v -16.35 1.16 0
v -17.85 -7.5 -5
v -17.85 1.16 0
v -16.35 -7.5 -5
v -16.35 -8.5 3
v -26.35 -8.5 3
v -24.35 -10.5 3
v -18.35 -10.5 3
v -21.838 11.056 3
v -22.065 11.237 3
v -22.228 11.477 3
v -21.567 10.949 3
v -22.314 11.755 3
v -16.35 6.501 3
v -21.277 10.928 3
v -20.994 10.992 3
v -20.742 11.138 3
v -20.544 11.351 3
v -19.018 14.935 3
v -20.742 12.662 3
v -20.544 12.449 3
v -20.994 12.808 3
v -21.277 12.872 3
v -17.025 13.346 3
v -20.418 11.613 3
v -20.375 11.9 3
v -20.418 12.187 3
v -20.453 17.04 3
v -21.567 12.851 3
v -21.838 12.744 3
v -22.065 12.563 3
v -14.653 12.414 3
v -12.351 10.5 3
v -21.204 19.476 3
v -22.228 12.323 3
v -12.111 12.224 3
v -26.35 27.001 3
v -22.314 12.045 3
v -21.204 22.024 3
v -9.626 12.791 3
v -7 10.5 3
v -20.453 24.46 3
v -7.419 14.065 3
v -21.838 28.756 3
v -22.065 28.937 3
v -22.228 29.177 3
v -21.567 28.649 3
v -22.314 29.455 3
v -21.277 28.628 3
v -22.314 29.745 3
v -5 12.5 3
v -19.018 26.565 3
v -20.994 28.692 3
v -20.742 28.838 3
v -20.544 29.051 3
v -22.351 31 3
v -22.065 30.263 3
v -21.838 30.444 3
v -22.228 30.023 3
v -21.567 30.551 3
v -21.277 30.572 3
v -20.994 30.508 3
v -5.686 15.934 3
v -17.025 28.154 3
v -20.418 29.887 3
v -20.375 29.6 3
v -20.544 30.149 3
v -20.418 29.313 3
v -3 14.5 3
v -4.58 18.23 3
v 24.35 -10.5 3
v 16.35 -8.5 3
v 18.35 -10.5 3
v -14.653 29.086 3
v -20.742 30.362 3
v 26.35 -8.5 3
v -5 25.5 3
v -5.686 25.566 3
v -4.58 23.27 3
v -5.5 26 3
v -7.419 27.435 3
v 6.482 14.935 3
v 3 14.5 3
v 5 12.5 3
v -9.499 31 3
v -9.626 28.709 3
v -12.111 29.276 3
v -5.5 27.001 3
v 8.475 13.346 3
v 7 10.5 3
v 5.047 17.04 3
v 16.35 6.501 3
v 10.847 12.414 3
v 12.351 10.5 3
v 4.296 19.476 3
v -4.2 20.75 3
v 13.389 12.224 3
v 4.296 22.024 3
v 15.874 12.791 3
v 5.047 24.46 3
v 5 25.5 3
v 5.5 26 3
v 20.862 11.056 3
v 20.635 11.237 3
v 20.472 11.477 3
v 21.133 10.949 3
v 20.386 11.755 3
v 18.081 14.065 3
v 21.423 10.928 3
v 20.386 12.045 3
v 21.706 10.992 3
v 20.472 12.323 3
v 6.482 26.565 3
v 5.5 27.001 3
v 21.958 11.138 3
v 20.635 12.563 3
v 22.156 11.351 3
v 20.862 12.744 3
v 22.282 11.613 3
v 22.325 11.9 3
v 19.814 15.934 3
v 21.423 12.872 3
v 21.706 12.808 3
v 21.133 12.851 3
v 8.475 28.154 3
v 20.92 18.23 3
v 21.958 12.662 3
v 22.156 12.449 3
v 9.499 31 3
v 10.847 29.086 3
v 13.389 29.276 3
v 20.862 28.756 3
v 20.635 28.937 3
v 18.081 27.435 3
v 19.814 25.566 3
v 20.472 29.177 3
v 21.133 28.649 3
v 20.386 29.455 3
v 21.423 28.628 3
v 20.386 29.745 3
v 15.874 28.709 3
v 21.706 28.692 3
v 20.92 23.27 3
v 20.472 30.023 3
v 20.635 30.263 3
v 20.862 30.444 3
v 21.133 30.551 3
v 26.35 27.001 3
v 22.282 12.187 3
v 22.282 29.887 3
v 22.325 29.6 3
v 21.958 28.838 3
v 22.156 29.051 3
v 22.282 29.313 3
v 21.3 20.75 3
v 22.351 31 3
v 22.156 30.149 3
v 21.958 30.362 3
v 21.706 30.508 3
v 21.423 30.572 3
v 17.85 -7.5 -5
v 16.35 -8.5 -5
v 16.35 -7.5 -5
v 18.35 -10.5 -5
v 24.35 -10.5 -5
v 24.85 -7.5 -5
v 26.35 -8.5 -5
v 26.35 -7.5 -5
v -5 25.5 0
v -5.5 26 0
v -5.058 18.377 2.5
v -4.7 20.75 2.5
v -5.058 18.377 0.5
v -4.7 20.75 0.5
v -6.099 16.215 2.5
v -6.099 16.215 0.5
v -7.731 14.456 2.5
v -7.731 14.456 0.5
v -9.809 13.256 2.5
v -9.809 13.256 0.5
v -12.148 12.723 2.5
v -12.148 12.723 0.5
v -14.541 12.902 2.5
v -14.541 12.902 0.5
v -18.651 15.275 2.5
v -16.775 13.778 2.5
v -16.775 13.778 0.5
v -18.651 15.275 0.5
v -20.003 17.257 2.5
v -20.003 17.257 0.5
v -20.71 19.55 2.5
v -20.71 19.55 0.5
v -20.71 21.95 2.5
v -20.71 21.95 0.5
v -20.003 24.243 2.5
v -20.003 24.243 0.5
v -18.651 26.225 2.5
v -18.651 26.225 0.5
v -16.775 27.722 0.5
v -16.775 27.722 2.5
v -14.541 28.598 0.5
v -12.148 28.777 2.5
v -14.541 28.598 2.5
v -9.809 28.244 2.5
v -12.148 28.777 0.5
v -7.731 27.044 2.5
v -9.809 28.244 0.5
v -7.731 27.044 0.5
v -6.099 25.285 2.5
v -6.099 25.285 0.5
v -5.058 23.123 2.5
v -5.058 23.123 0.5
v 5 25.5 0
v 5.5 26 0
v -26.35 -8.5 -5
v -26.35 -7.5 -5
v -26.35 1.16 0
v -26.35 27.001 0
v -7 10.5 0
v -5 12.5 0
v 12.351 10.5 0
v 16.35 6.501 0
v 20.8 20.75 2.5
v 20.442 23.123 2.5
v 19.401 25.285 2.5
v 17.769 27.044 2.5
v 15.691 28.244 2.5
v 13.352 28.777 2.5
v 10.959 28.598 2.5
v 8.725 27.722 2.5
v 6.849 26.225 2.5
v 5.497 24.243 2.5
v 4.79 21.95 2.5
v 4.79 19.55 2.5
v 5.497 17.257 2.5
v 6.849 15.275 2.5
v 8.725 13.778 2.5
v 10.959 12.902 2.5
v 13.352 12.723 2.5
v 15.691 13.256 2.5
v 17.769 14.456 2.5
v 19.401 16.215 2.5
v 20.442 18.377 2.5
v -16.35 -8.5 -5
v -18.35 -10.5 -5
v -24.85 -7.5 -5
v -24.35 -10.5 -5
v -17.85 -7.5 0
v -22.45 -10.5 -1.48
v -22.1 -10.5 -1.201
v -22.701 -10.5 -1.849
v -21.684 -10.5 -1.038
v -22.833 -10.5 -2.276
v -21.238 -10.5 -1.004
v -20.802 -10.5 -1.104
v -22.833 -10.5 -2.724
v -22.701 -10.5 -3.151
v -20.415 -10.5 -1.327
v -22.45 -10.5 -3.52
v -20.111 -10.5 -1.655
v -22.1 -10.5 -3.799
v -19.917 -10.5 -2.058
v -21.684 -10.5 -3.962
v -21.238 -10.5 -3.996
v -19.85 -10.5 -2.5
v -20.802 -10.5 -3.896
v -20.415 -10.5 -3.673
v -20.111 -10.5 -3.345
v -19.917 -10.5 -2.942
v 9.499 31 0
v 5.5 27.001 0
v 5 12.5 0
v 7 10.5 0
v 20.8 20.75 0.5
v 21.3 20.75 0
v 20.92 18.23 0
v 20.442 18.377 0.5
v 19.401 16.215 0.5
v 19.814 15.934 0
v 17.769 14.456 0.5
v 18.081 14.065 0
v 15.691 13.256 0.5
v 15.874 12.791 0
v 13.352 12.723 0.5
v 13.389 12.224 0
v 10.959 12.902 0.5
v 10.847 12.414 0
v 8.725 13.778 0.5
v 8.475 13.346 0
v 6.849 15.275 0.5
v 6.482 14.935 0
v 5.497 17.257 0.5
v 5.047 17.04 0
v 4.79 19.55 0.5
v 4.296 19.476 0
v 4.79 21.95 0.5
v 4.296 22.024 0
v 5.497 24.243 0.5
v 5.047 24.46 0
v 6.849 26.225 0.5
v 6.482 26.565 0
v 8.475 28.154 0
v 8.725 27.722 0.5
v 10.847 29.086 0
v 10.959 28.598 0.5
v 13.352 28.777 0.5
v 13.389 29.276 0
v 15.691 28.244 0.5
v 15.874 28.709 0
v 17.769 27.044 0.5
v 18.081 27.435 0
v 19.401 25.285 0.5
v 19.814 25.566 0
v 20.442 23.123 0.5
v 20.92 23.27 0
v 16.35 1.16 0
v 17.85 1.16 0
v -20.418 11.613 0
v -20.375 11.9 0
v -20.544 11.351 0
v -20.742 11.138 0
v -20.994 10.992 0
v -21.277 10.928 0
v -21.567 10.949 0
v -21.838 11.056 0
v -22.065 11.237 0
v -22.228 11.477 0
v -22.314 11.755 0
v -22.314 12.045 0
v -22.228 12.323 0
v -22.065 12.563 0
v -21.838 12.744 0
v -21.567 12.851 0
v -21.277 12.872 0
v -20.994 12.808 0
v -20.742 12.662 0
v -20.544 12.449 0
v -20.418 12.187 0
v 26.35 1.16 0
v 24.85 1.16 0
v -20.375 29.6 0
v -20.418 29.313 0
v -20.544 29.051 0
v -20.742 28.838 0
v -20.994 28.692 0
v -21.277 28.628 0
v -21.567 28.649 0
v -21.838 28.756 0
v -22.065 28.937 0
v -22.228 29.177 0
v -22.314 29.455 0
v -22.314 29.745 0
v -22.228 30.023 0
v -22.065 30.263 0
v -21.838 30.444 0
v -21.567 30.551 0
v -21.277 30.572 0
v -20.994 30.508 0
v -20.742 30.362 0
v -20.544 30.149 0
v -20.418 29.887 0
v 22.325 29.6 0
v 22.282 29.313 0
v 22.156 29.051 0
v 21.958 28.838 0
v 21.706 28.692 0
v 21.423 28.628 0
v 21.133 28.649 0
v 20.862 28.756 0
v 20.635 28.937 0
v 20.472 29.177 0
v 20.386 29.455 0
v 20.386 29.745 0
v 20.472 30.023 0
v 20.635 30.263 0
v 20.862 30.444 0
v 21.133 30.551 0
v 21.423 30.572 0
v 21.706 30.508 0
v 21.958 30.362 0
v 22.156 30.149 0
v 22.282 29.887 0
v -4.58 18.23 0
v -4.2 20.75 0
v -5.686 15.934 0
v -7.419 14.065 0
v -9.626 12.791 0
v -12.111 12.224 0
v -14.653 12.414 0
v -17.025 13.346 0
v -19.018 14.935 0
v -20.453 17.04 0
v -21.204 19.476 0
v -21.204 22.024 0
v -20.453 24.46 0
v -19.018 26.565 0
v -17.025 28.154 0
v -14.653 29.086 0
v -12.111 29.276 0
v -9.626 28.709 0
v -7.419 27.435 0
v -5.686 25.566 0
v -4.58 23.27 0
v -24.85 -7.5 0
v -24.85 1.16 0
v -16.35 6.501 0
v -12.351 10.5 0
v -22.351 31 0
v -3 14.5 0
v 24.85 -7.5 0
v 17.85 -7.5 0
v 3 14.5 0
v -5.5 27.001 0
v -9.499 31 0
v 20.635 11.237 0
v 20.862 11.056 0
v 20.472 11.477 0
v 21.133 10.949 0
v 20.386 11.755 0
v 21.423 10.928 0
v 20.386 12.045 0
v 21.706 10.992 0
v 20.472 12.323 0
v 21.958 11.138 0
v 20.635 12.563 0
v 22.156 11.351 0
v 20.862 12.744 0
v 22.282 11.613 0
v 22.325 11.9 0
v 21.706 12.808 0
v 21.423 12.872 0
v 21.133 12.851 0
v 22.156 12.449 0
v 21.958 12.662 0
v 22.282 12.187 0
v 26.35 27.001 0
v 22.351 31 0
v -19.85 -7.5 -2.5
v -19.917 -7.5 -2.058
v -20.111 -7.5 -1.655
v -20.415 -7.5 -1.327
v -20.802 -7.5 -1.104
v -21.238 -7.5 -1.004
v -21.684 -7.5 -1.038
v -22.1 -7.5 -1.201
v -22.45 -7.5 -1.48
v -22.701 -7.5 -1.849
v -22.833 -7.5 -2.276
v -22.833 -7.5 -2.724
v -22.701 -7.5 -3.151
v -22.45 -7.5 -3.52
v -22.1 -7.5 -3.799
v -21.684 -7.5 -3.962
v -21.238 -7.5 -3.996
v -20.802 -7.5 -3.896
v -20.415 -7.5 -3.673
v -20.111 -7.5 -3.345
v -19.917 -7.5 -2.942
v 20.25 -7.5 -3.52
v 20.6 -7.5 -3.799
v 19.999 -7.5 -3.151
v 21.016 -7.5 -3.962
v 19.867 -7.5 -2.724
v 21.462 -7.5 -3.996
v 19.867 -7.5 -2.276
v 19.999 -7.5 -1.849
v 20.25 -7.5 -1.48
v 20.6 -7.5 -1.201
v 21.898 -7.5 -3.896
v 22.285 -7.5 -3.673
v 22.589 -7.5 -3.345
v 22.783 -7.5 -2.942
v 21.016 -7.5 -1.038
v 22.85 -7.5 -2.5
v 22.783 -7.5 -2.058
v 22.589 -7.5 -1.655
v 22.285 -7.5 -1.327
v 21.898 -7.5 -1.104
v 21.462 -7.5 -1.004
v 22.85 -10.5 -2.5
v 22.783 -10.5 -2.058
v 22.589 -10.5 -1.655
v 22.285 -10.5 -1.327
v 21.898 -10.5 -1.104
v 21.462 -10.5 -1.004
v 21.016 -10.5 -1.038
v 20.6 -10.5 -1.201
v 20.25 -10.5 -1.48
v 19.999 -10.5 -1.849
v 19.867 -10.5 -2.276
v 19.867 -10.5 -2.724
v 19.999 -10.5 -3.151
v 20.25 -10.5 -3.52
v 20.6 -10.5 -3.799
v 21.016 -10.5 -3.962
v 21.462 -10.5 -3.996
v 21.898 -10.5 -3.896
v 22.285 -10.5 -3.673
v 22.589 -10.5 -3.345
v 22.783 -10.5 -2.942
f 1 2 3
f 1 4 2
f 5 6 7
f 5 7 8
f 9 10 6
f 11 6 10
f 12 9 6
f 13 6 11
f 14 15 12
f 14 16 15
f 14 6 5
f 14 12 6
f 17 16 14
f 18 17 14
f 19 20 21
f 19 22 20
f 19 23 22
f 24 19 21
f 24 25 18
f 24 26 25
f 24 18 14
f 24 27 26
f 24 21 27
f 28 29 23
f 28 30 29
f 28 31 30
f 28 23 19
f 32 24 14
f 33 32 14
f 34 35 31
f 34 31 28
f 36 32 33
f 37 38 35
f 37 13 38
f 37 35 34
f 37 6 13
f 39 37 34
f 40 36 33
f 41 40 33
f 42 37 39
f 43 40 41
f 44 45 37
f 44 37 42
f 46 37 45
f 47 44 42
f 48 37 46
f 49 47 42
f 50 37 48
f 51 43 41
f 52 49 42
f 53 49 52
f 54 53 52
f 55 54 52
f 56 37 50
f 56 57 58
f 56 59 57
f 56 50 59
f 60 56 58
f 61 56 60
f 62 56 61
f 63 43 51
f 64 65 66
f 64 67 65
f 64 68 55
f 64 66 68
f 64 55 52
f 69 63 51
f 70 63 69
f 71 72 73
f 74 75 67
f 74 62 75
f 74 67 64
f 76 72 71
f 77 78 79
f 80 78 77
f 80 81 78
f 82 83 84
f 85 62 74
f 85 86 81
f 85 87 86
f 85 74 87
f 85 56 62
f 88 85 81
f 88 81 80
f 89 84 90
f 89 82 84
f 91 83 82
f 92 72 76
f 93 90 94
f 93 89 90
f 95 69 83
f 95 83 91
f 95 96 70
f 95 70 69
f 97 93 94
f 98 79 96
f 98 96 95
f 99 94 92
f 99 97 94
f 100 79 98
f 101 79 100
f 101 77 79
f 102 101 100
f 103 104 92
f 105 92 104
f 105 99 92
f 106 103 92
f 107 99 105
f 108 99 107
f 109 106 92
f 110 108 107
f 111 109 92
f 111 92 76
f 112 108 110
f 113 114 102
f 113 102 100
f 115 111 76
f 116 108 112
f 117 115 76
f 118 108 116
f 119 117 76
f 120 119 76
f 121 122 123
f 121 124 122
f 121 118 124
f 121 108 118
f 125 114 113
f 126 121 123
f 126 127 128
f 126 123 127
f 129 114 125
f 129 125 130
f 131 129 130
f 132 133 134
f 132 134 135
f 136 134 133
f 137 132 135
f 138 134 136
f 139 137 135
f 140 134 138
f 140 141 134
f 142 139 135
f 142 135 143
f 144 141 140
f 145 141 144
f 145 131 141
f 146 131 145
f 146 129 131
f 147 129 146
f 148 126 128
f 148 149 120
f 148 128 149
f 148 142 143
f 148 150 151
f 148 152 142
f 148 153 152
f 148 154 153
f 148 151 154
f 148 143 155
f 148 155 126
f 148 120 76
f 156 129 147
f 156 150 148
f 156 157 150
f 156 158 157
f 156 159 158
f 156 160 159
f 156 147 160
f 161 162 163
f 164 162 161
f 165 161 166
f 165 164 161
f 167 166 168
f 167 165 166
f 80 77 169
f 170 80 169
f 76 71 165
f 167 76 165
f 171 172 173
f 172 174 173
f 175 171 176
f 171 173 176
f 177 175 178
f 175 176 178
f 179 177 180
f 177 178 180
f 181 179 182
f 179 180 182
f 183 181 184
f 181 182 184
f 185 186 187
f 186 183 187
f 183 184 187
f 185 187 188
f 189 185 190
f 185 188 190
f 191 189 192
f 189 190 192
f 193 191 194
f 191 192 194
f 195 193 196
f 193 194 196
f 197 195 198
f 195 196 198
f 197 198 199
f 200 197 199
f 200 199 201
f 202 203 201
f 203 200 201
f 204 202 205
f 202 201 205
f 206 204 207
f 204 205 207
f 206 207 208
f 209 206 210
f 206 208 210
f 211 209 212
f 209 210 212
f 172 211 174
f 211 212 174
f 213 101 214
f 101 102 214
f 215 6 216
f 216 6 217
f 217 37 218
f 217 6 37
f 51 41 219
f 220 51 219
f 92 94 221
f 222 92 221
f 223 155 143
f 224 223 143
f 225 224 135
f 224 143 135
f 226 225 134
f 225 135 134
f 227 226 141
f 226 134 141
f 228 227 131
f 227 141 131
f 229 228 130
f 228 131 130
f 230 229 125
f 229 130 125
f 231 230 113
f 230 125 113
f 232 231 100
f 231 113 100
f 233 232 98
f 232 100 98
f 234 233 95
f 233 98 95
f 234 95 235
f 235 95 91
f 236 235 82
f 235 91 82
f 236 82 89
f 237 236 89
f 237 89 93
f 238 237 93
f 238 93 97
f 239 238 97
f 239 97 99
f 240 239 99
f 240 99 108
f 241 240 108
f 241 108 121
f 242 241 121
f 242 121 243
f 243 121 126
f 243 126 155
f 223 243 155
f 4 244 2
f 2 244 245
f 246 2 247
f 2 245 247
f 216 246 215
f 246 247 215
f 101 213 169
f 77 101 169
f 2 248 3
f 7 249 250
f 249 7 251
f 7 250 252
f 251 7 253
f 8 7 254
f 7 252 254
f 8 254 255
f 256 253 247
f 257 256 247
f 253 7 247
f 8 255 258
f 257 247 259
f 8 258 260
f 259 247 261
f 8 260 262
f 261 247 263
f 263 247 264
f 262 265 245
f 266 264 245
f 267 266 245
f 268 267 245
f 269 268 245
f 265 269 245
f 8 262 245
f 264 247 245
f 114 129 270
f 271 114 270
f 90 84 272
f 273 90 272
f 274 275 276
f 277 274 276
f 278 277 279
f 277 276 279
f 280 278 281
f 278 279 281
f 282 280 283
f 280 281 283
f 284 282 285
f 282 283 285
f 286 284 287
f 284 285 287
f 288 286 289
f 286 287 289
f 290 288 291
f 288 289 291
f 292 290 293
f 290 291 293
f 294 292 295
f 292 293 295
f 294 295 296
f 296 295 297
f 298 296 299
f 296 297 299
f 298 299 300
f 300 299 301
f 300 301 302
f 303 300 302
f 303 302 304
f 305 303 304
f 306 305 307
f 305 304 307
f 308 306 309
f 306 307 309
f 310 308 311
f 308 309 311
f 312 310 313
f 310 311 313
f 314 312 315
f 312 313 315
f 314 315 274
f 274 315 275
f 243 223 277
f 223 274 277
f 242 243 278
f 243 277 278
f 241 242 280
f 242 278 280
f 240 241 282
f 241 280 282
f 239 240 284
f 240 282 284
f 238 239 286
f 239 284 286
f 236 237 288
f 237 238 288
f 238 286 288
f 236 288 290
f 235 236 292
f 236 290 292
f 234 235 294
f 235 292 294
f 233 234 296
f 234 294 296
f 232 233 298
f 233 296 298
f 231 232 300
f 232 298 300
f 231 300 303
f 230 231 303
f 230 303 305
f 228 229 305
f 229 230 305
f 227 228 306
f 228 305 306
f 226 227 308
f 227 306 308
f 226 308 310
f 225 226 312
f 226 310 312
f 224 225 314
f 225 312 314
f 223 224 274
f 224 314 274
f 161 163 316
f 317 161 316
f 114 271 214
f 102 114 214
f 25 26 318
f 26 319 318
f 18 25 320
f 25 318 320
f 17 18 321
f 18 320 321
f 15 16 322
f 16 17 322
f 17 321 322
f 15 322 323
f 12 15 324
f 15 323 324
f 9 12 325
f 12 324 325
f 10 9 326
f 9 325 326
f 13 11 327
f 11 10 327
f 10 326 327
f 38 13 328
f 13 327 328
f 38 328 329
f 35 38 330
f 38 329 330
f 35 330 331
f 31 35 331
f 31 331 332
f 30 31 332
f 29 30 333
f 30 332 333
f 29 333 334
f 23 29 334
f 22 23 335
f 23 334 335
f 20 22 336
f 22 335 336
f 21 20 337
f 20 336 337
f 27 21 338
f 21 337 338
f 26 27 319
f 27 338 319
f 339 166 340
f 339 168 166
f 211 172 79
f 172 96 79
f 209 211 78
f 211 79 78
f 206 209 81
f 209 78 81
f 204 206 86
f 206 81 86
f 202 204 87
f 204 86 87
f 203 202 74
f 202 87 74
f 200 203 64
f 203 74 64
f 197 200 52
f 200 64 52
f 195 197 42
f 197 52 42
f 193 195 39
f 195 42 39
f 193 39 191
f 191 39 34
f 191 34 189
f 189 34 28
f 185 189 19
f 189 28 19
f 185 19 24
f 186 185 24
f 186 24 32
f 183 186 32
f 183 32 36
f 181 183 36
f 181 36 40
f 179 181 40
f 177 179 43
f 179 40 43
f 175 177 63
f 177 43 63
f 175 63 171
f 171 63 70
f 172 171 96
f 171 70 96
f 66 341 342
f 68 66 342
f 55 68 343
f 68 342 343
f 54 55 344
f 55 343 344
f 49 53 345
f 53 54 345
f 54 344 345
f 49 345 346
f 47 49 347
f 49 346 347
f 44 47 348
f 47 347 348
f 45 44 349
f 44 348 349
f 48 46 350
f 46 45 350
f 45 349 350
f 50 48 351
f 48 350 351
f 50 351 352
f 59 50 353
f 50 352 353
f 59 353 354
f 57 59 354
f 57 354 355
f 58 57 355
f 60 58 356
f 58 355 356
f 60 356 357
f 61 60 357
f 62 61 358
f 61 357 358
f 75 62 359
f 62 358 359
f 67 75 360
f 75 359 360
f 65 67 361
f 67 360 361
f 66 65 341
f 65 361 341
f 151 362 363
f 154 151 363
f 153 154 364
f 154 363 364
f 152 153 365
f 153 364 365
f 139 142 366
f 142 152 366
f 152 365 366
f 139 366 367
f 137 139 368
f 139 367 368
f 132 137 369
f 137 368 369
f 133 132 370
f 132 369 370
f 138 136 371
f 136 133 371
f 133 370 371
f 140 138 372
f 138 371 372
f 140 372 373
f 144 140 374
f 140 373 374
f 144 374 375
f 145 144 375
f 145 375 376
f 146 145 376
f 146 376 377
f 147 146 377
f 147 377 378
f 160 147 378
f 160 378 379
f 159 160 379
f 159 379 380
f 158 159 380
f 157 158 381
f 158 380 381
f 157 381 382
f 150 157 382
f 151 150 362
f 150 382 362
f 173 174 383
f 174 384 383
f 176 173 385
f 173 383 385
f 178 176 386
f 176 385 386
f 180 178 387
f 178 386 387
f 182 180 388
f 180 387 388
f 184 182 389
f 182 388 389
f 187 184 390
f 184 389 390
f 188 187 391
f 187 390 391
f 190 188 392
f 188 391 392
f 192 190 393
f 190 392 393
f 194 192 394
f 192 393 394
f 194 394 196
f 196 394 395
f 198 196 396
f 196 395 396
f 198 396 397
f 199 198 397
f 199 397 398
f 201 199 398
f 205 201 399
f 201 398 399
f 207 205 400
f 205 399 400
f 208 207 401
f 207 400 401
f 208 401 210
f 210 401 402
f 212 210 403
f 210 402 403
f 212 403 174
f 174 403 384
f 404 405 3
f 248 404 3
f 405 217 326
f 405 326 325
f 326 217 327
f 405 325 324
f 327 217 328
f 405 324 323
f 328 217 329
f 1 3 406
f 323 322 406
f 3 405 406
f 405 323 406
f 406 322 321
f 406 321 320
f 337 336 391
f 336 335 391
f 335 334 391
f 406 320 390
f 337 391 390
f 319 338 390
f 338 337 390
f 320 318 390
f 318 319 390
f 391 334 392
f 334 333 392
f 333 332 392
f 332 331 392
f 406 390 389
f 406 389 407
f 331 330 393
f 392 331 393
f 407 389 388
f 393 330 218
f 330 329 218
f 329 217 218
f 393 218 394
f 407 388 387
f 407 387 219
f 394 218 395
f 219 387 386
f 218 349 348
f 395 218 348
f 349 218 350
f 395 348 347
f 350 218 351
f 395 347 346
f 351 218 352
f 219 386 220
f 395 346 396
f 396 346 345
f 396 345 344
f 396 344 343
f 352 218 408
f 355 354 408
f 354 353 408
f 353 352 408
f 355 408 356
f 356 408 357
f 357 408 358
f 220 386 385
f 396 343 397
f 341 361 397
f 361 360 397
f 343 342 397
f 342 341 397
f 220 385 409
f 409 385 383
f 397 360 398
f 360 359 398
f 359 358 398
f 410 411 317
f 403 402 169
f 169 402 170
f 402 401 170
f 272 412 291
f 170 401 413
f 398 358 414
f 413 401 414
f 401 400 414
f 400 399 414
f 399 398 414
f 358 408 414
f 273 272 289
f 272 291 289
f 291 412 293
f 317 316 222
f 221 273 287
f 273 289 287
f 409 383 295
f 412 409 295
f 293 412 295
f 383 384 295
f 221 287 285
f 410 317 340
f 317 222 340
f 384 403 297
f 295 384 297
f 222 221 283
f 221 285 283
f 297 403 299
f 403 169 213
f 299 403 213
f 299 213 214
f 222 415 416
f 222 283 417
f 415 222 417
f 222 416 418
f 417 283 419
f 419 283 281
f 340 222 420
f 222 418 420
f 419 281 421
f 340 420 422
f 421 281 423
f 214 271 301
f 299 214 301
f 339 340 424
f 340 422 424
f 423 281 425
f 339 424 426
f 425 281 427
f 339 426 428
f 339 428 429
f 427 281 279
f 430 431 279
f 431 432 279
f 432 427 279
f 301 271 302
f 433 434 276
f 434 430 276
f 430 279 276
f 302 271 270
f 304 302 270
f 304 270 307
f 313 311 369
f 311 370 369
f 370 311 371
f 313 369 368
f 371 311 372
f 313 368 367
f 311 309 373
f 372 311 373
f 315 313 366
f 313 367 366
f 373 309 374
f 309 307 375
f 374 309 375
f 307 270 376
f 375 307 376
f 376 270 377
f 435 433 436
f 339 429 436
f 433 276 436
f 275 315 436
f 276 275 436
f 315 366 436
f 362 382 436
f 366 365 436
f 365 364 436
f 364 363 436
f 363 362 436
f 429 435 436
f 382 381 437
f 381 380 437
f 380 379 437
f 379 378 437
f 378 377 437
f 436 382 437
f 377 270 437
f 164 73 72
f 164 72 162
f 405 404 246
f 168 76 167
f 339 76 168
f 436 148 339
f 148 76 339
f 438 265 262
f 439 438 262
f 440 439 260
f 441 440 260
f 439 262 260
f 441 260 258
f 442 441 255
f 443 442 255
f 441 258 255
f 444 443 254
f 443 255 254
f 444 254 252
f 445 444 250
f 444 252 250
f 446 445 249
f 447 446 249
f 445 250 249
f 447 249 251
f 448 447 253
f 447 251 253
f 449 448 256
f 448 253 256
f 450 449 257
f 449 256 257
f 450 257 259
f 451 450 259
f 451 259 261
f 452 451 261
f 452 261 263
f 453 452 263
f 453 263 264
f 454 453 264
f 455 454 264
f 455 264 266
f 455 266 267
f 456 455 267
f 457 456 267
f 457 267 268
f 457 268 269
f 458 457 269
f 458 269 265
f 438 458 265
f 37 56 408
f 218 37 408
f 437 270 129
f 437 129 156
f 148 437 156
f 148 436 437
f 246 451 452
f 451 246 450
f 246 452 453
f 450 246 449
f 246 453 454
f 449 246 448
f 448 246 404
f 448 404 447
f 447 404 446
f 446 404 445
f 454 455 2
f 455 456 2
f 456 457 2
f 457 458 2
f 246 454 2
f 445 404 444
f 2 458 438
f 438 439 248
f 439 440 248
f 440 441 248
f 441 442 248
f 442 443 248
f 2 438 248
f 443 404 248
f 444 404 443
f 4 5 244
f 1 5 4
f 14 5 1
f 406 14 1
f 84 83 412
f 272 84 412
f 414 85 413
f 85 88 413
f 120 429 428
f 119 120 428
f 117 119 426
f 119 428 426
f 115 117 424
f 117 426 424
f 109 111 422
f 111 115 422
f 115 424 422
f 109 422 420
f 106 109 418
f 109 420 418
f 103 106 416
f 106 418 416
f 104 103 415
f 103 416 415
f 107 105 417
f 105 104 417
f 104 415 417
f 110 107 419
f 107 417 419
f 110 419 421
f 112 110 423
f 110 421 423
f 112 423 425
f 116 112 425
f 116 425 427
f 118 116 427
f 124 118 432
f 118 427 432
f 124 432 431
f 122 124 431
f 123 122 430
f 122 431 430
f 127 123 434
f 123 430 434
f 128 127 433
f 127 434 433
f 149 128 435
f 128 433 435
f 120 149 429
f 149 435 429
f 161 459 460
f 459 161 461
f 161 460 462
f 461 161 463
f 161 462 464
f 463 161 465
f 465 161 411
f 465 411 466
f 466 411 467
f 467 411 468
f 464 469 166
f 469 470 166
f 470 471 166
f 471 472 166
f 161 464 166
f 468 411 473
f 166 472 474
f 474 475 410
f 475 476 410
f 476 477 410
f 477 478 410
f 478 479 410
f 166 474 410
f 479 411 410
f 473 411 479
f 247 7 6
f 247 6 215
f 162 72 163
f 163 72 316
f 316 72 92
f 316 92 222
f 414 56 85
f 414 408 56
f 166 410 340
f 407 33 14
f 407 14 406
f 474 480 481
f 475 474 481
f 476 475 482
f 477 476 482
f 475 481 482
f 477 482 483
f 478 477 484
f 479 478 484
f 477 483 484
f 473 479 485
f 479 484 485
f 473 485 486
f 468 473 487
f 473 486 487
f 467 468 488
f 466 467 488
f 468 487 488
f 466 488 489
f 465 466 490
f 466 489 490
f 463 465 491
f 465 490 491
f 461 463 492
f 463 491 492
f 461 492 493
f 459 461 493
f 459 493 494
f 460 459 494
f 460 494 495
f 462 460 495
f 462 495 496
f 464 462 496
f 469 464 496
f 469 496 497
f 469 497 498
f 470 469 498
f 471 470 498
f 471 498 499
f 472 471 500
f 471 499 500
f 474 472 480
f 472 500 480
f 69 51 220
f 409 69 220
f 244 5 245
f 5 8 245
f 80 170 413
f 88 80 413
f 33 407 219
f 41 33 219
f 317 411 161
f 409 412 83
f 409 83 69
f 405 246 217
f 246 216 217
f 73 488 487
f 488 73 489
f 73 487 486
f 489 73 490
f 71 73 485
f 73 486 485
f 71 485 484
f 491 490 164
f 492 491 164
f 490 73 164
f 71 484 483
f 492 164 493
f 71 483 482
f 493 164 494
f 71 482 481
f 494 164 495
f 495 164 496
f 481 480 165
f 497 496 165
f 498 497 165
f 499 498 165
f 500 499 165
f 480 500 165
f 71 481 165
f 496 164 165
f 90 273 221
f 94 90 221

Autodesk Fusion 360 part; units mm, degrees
sketch "Sketch1" plane through (0, 0, 0) normal (0, 0, 1) x (1, 0, 0)
  line L0 (-26.35, 10.5) -> (-26.35, -10.5)
  line L1 (-26.35, -10.5) -> (-16.35, -10.5)
  line L2 (-16.35, -10.5) -> (-16.35, 10.5)
  line L3 (-16.35, 10.5) -> (16.35, 10.5)
  line L4 (16.35, 10.5) -> (16.35, -10.5)
  line L5 (16.35, -10.5) -> (26.35, -10.5)
  line L6 (26.35, -10.5) -> (26.35, 10.5)
  line L7 (-26.35, -10.5) -> (26.35, 10.5) construction
  line L8 (-26.35, 10.5) -> (-26.35, 31)
  line L9 (-26.35, 31) -> (26.35, 31)
  line L10 (26.35, 31) -> (26.35, 10.5)
  line L11 (-22.75, 31) -> (22.75, 31) construction
  line L12 (22.75, 31) -> (22.75, 10.5) construction
  line L13 (22.75, 10.5) -> (-22.75, 10.5) construction
  line L14 (-22.75, 10.5) -> (-22.75, 31) construction
  line L15 (-22.75, 10.5) -> (22.75, 31) construction
  circle A0 centre (-21.35, 11.9) radius 0.975
  line L16 (-22.75, 20.75) -> (22.75, 20.75) construction
  line L17 (0, 10.5) -> (0, 31) construction
  circle A1 centre (-21.35, 29.6) radius 0.975
  circle A2 centre (21.35, 11.9) radius 0.975
  circle A3 centre (21.35, 29.6) radius 0.975
  circle A4 centre (-12.75, 20.75) radius 8.05
  circle A5 centre (12.75, 20.75) radius 8.05
  line L18 (0, 10.5) -> (0, 31) construction
  line L19 (5.5, 31) -> (5.5, 25.5)
  line L20 (5.5, 25.5) -> (-5.5, 25.5)
  line L21 (-5.5, 25.5) -> (-5.5, 31)
  line L22 (5, 14.5) -> (-5, 14.5)
  line L23 (-5, 14.5) -> (-5, 10.5)
  line L24 (5, 10.5) -> (5, 14.5)
  point P0 (0, 20.75)
  point P1 (0, 20.75)
  point P2 (0, 31.5)
  point P3 (0, 25.5)
  point P4 (0, 14.5)
  dimension "d3" = 10
  dimension "d4" = 52.7
  dimension "d5" = 21
  dimension "d6" = 20.5
  dimension "d7" = 45.5
  dimension "d8" = 20.5
  dimension "d9" = 1.95
  dimension "d10" = 1.4
  dimension "d11" = 1.4
  dimension "d12" = 16.1
  dimension "d13" = 10
  dimension "d16" = 11
  dimension "d17" = 5.5
  dimension "d19" = 4
  dimension "d20" = 10
extrude "Extrude1" add sketch "Sketch1" along normal blind 3 contours L0 L1 L2 L3 L4 L5 L6 L8 L9 L10 L19 L20 L21 L22 L23 L24
sketch "Sketch2" plane through (0, -10.5, 0) normal (0, -1, 0) x (1, 0, 0)
  line L0 (16.35, 0) -> (26.35, 0)
  line L1 (26.35, 0) -> (26.35, 3)
  line L2 (26.35, 3) -> (16.35, 3)
  line L3 (16.35, 3) -> (16.35, 0)
  line L4 (16.35, 0) -> (16.35, -5)
  line L5 (16.35, -5) -> (26.35, -5)
  line L6 (26.35, -5) -> (26.35, 0)
  line L7 (0, 0) -> (0, -5) construction
  line L8 (-16.35, 0) -> (-16.35, -5)
  line L9 (-16.35, -5) -> (-26.35, -5)
  line L10 (-26.35, -5) -> (-26.35, 0)
  line L11 (-26.35, 0) -> (-16.35, 0)
  circle A0 centre (21.35, -2.5) radius 1.5
  line L12 (16.35, 0) -> (26.35, -5) construction
  circle A1 centre (-21.35, -2.5) radius 1.5
  dimension "d21" = 5
  dimension "d24" = 3
extrude "Extrude2" add sketch "Sketch2" against normal blind 3 contours L0 L4 L5 L6 | L8 L9 L10 L11
sketch "Sketch3" plane through (26.35, 0, 0) normal (1, 0, 0) x (0, 0, -1)
  line L0 (0, -7.5) -> (0, 31)
  line L1 (0, 31) -> (-3, 31)
  line L2 (-3, 31) -> (-3, -10.5)
  line L3 (-3, -10.5) -> (5, -10.5)
  line L4 (5, -10.5) -> (5, -7.5)
  line L5 (5, -7.5) -> (0, -7.5)
  line L6 (5, -7.5) -> (0, 1.1603)
  line L7 (0, 1.1603) -> (0, -7.5)
  line L8 (5, -7.5) -> (0, -7.5)
  dimension "d27" = 60
extrude "Extrude3" add sketch "Sketch3" against normal blind 1.5 contours L0 L5 L6 L7 L8
extrude "Extrude4" add sketch "Sketch3" along normal blind 1.5 from surface at -10 contours L0 L5 L6 L7 L8
extrude "Extrude5" add sketch "Sketch3" along normal blind 1.5 from surface at -52.7 contours L0 L5 L6 L7 L8
extrude "Extrude6" add sketch "Sketch3" against normal blind 1.5 from surface at -42.7 contours L0 L5 L6 L7 L8
chamfer "Chamfer1" distance 2 angle 45 8 edges at (26.35, -10.5, -1) (16.35, -10.5, -1) (-16.35, -10.5, -1) (-26.35, -10.5, -1) (-5, 14.5, 1.5) (5, 14.5, 1.5) (5, 10.5, 1.5) (-5, 10.5, 1.5)
chamfer "Chamfer1" distance 4 angle 45 4 edges at (-16.35, 10.5, 1.5) (16.35, 10.5, 1.5) (26.35, 31, 1.5) (-26.35, 31, 1.5)
chamfer "Chamfer1" distance 0.5 angle 45 6 edges at (5.2448, 23.661, 3) (5.2448, 23.661, 0) (-20.2552, 23.661, 3) (-20.2552, 23.661, 0) (-5.5, 25.5, 1.5) (5.5, 25.5, 1.5)
chamfer "Chamfer1" distance 4 angle 45 2 edges at (-5.5, 31, 1.5) (5.5, 31, 1.5)
